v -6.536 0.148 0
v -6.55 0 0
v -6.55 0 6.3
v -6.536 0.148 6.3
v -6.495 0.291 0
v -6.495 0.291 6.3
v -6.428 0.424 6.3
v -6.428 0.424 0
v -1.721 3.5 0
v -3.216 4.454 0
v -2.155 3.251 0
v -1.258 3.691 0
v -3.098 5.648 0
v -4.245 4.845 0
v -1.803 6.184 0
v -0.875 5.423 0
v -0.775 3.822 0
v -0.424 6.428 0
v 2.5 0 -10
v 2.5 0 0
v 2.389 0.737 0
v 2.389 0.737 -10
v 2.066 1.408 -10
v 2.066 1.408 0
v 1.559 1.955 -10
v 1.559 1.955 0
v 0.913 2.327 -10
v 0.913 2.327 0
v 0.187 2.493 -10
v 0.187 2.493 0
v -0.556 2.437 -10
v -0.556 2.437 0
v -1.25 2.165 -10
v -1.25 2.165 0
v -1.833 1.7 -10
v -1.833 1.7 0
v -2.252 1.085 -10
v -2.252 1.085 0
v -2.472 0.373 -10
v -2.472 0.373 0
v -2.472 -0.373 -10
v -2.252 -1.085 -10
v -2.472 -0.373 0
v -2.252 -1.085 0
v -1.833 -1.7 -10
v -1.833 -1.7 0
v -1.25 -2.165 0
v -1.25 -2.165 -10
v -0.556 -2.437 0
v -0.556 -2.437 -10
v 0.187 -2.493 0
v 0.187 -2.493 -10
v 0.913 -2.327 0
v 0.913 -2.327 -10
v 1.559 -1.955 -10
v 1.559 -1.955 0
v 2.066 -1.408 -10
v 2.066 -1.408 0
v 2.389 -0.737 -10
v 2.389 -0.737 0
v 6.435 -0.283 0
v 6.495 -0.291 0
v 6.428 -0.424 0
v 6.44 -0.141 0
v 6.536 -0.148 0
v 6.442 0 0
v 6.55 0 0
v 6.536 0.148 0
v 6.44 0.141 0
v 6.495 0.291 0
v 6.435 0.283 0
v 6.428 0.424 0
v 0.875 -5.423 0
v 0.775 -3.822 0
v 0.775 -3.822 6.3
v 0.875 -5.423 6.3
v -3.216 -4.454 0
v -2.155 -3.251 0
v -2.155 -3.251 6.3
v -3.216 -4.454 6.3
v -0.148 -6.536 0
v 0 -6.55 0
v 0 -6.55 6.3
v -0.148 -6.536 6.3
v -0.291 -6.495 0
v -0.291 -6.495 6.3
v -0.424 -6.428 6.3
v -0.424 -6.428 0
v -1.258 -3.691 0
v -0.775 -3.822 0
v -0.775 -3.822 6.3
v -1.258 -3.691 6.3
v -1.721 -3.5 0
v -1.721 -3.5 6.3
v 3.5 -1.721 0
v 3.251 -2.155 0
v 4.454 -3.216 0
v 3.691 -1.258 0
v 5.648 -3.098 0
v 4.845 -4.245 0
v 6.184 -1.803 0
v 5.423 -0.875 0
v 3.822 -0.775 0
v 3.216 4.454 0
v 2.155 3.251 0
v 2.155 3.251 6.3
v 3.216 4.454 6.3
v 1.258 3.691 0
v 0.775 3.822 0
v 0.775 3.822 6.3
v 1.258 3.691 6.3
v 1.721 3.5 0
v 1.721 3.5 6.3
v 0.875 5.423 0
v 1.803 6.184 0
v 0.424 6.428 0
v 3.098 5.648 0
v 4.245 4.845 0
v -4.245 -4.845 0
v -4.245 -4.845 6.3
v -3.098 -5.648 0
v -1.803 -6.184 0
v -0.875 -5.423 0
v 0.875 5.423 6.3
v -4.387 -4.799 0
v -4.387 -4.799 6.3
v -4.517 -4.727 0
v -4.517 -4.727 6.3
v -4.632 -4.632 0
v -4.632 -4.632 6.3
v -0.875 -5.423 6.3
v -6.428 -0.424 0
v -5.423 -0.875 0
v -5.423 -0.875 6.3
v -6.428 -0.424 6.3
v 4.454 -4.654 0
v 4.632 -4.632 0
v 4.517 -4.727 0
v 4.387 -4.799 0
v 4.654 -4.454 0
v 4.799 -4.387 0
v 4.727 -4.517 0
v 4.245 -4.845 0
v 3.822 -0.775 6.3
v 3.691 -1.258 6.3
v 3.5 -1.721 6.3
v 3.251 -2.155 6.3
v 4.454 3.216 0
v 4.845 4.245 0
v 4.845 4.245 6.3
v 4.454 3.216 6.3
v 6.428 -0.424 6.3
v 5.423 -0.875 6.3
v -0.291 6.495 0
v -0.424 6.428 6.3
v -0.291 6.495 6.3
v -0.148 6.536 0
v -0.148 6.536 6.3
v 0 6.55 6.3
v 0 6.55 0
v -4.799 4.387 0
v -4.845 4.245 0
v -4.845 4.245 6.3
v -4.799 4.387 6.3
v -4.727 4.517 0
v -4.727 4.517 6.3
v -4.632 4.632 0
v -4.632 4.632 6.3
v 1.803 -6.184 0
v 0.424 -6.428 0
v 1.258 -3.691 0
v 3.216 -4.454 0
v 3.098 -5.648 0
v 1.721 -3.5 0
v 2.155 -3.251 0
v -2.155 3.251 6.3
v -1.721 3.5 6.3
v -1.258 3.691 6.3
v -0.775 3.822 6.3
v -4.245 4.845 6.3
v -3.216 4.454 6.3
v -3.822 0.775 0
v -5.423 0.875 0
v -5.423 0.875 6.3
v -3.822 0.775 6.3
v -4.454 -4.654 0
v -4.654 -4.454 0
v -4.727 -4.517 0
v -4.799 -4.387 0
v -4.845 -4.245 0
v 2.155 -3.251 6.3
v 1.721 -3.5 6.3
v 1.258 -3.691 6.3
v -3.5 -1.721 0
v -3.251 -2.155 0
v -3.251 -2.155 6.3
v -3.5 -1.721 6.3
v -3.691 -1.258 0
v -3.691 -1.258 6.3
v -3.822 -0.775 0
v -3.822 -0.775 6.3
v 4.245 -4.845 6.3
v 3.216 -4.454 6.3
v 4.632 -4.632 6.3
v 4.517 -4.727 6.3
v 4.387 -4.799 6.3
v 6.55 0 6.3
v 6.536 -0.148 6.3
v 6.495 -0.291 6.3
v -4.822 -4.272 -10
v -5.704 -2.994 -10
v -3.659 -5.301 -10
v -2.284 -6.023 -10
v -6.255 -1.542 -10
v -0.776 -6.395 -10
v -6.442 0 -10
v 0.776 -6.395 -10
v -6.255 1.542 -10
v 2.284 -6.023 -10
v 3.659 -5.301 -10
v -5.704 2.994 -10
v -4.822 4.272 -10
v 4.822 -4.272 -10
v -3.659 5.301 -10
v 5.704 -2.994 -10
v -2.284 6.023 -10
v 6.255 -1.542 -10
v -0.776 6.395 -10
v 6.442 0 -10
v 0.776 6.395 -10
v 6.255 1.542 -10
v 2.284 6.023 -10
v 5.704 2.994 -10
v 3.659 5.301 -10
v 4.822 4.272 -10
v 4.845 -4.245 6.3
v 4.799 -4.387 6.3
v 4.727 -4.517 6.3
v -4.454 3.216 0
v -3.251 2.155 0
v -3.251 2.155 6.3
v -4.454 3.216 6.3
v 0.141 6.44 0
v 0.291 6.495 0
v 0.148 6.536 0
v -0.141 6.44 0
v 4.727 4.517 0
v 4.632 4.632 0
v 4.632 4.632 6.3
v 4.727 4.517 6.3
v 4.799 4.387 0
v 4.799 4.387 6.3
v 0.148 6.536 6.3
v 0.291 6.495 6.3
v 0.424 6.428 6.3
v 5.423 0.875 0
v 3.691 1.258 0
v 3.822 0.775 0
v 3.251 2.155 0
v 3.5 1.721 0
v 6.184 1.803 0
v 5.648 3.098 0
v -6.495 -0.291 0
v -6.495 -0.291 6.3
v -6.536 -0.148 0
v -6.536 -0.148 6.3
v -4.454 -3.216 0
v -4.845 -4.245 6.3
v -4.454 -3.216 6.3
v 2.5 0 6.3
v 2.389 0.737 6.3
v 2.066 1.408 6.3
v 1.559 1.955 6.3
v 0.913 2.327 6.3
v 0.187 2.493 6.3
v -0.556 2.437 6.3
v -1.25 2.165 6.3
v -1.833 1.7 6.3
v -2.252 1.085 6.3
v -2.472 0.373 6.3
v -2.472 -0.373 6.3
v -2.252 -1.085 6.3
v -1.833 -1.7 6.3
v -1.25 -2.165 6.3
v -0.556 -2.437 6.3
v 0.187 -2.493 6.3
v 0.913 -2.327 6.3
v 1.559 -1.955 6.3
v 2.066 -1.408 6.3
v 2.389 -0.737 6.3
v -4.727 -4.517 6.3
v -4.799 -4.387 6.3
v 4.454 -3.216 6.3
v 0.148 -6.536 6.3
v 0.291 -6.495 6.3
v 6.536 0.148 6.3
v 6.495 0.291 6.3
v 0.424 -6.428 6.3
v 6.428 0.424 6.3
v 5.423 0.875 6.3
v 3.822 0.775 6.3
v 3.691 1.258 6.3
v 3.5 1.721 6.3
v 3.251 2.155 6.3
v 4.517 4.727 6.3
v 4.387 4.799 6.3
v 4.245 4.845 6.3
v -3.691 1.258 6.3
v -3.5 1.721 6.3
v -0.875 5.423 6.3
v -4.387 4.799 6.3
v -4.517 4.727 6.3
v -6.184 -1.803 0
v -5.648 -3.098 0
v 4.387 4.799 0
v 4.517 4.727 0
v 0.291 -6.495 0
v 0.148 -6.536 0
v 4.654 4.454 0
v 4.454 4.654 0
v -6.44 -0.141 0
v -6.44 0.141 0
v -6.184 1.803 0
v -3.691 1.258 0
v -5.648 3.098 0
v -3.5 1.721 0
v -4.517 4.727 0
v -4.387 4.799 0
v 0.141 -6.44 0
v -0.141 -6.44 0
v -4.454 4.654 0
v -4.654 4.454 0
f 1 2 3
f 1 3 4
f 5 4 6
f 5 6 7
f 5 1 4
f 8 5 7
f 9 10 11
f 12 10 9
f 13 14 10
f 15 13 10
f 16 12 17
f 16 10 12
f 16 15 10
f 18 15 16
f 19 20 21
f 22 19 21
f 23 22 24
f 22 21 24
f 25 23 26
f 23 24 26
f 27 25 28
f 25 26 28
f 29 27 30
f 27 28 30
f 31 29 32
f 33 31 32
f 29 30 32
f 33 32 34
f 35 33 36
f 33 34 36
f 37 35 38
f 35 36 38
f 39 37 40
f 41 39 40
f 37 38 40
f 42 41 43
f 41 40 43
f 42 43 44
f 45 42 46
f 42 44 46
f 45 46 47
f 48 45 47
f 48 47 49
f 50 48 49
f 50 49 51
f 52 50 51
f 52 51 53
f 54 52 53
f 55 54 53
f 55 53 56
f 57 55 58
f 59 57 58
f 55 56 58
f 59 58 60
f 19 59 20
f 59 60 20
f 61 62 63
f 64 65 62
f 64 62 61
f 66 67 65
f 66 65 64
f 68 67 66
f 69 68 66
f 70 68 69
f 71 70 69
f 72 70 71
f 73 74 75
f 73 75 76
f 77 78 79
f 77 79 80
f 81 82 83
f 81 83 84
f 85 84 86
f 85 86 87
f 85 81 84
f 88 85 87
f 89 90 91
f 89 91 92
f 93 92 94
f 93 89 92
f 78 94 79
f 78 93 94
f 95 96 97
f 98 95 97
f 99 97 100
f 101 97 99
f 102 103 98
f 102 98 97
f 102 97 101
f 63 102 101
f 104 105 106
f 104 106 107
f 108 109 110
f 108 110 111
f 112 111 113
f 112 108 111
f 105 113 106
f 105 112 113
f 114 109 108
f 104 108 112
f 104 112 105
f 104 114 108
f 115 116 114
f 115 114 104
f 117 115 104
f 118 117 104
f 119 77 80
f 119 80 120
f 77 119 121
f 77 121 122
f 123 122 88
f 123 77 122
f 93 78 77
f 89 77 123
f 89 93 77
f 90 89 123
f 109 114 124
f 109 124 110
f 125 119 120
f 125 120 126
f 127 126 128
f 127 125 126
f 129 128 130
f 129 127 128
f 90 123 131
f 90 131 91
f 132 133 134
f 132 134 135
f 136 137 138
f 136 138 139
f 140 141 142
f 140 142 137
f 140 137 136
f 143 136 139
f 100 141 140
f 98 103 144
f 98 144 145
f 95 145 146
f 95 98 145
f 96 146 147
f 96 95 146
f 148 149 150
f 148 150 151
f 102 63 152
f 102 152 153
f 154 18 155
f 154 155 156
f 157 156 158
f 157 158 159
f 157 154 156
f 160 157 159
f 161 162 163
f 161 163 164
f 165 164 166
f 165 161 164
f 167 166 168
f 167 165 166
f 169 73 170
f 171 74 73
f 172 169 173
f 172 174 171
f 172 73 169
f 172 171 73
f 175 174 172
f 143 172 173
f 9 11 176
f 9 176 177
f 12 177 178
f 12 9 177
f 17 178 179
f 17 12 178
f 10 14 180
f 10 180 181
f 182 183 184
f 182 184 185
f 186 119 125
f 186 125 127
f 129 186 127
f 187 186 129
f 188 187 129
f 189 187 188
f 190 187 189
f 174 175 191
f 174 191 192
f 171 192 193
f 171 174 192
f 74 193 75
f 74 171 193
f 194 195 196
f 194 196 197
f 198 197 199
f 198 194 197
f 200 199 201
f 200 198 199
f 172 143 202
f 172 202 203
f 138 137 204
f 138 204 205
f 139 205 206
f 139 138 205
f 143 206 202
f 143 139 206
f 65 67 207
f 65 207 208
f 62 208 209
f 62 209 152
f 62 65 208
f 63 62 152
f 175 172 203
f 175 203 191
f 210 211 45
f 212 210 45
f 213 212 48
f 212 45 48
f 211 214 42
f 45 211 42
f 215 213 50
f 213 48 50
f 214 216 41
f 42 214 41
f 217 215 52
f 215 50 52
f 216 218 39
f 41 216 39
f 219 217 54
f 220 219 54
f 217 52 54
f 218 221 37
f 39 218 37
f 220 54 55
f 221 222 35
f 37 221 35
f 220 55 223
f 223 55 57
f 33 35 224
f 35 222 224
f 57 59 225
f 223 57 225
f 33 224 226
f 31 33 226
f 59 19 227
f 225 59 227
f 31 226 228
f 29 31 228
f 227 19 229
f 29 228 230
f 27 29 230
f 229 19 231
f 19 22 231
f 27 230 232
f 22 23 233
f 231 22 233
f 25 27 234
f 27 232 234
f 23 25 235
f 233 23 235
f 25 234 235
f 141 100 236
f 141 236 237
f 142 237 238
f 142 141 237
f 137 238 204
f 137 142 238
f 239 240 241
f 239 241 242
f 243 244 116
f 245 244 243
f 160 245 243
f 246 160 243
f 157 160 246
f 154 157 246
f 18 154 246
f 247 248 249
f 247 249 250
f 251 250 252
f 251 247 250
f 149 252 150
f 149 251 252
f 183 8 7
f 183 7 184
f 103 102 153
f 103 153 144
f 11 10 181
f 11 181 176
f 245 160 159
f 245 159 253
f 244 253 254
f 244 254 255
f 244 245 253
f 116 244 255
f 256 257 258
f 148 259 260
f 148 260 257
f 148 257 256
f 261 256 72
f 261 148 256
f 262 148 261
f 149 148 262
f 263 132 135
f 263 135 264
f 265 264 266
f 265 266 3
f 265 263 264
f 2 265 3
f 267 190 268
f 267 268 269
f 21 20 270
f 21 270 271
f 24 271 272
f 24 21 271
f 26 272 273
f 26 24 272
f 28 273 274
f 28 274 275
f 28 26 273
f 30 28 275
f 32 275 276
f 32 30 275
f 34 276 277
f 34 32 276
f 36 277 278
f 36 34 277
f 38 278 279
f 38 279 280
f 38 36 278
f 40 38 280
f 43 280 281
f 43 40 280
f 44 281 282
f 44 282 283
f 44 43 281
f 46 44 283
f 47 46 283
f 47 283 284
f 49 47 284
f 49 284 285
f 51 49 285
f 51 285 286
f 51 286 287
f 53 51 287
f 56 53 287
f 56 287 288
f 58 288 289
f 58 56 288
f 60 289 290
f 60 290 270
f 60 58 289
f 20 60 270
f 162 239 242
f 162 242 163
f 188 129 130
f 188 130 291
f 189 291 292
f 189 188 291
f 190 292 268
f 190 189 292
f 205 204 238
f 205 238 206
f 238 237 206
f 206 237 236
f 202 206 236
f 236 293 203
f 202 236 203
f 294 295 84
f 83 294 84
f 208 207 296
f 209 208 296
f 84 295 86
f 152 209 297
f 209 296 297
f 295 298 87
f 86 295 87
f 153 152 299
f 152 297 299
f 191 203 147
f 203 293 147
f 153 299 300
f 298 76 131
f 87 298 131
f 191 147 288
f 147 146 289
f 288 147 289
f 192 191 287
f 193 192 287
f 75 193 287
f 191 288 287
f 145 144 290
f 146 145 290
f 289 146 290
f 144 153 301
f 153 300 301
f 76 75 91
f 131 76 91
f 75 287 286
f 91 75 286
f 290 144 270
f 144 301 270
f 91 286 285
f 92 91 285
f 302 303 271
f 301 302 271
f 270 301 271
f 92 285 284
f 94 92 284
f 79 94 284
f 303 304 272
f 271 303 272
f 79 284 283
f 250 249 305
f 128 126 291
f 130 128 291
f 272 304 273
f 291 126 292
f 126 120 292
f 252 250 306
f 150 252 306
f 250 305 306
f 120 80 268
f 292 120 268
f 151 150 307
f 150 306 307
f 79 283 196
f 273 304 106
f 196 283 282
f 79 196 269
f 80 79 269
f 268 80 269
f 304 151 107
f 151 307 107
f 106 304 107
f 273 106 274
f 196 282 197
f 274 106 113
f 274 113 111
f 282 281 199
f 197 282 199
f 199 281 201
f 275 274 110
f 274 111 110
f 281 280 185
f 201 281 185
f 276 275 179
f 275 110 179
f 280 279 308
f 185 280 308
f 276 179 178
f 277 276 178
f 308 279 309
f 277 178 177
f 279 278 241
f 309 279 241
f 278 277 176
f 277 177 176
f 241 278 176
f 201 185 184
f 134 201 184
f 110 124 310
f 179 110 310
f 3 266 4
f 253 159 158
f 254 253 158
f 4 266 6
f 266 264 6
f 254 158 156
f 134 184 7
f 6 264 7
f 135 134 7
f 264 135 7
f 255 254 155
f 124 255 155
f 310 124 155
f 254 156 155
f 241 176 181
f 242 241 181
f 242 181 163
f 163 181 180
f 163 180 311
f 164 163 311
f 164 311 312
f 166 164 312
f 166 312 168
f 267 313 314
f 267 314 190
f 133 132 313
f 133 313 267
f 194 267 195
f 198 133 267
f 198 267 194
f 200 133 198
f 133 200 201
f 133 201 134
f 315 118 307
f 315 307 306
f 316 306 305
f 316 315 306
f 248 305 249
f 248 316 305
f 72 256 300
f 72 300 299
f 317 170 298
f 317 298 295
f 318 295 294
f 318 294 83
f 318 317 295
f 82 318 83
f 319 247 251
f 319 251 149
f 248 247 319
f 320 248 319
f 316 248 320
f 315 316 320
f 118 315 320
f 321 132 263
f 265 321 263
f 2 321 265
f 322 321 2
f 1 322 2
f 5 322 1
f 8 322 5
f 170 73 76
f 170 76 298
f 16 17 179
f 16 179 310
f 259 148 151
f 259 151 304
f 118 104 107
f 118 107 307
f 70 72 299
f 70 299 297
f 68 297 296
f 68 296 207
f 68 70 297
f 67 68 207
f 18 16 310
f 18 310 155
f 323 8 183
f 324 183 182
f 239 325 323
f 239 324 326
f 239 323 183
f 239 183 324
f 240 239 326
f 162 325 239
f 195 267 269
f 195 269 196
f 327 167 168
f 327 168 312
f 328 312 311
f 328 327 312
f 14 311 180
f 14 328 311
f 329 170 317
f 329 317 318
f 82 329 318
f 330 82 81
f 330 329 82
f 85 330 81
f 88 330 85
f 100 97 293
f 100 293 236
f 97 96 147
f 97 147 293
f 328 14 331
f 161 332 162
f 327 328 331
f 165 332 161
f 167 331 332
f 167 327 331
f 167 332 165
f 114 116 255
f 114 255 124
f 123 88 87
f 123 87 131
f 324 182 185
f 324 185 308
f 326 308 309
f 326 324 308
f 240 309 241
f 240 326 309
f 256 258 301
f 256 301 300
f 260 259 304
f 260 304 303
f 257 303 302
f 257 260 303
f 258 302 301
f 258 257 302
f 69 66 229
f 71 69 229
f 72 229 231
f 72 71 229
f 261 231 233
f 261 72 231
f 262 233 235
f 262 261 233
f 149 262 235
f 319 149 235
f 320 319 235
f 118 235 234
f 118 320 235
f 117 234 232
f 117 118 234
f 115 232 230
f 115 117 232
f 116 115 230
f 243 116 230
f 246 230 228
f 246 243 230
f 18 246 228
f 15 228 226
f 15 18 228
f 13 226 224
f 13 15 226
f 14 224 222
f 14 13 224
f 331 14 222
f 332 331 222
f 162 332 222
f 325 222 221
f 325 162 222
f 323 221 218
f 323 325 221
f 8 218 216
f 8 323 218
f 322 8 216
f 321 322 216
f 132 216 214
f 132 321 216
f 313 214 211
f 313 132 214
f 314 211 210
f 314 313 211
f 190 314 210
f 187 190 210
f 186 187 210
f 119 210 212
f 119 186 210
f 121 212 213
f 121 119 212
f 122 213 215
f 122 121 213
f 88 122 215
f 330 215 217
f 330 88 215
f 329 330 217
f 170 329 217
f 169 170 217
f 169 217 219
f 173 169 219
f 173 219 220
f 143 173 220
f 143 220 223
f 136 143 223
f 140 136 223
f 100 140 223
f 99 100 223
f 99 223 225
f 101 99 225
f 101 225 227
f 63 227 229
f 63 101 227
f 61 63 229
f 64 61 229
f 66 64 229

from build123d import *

# Parameters (mm, degrees)
SZKIC1_R                    = 2.5
DODANIE_WYCI_GNI_CIE1_DEPTH = 6.3
SKETCH1_R                   = 6.441701171
SKETCH1_R_2                 = 2.5
BOSS_EXTRUDE1_DEPTH         = 10


with BuildPart() as part:
    # Szkic1 → Dodanie-wyciągnięcie1 (new body)
    with BuildSketch(Plane.XY):
        with BuildLine():
            Line((0.875, 5.423398291), (0.775, 3.822221213))
            ThreePointArc((0.775, 3.822221213), (1.492465386, 3.603130177), (2.154710783, 3.250726294))
            Line((2.154710783, 3.250726294), (3.216203275, 4.453640142))
            Line((3.216203275, 4.453640142), (4.245186445, 4.844987722))
            ThreePointArc((4.245186445, 4.844987722), (4.453444634, 4.765560203), (4.631549417, 4.631549417))
            ThreePointArc((4.631549417, 4.631549417), (4.765560203, 4.453444634), (4.844987722, 4.245186445))
            Line((4.844987722, 4.245186445), (4.453640142, 3.216203275))
            Line((4.453640142, 3.216203275), (3.250726294, 2.154710783))
            ThreePointArc((3.250726294, 2.154710783), (3.603130177, 1.492465386), (3.822221213, 0.775))
            Line((3.822221213, 0.775), (5.423398291, 0.875))
            Line((5.423398291, 0.875), (6.427723795, 0.424123551))
            ThreePointArc((6.427723795, 0.424123551), (6.518820836, 0.220699035), (6.55, 0))
            ThreePointArc((6.55, 0), (6.518820836, -0.220699035), (6.427723795, -0.424123551))
            Line((6.427723795, -0.424123551), (5.423398291, -0.875))
            Line((5.423398291, -0.875), (3.822221213, -0.775))
            ThreePointArc((3.822221213, -0.775), (3.603130177, -1.492465386), (3.250726294, -2.154710783))
            Line((3.250726294, -2.154710783), (4.453640142, -3.216203275))
            Line((4.453640142, -3.216203275), (4.844987722, -4.245186445))
            ThreePointArc((4.844987722, -4.245186445), (4.765560203, -4.453444634), (4.631549417, -4.631549417))
            ThreePointArc((4.631549417, -4.631549417), (4.453444634, -4.765560203), (4.245186445, -4.844987722))
            Line((4.245186445, -4.844987722), (3.216203275, -4.453640142))
            Line((3.216203275, -4.453640142), (2.154710783, -3.250726294))
            ThreePointArc((2.154710783, -3.250726294), (1.492465386, -3.603130177), (0.775, -3.822221213))
            Line((0.775, -3.822221213), (0.875, -5.423398291))
            Line((0.875, -5.423398291), (0.424123551, -6.427723795))
            ThreePointArc((0.424123551, -6.427723795), (0.220699035, -6.518820836), (0, -6.55))
            ThreePointArc((0, -6.55), (-0.220699035, -6.518820836), (-0.424123551, -6.427723795))
            Line((-0.424123551, -6.427723795), (-0.875, -5.423398291))
            Line((-0.875, -5.423398291), (-0.775, -3.822221213))
            ThreePointArc((-0.775, -3.822221213), (-1.492465386, -3.603130177), (-2.154710783, -3.250726294))
            Line((-2.154710783, -3.250726294), (-3.216203275, -4.453640142))
            Line((-3.216203275, -4.453640142), (-4.245186445, -4.844987722))
            ThreePointArc((-4.245186445, -4.844987722), (-4.453444634, -4.765560203), (-4.631549417, -4.631549417))
            ThreePointArc((-4.631549417, -4.631549417), (-4.765560203, -4.453444634), (-4.844987722, -4.245186445))
            Line((-4.844987722, -4.245186445), (-4.453640142, -3.216203275))
            Line((-4.453640142, -3.216203275), (-3.250726294, -2.154710783))
            ThreePointArc((-3.250726294, -2.154710783), (-3.603130177, -1.492465386), (-3.822221213, -0.775))
            Line((-3.822221213, -0.775), (-5.423398291, -0.875))
            Line((-5.423398291, -0.875), (-6.427723795, -0.424123551))
            ThreePointArc((-6.427723795, -0.424123551), (-6.518820836, -0.220699035), (-6.55, 0))
            ThreePointArc((-6.55, 0), (-6.518820836, 0.220699035), (-6.427723795, 0.424123551))
            Line((-6.427723795, 0.424123551), (-5.423398291, 0.875))
            Line((-5.423398291, 0.875), (-3.822221213, 0.775))
            ThreePointArc((-3.822221213, 0.775), (-3.603130177, 1.492465386), (-3.250726294, 2.154710783))
            Line((-3.250726294, 2.154710783), (-4.453640142, 3.216203275))
            Line((-4.453640142, 3.216203275), (-4.844987722, 4.245186445))
            ThreePointArc((-4.844987722, 4.245186445), (-4.765560203, 4.453444634), (-4.631549417, 4.631549417))
            ThreePointArc((-4.631549417, 4.631549417), (-4.453444634, 4.765560203), (-4.245186445, 4.844987722))
            Line((-4.245186445, 4.844987722), (-3.216203275, 4.453640142))
            Line((-3.216203275, 4.453640142), (-2.154710783, 3.250726294))
            ThreePointArc((-2.154710783, 3.250726294), (-1.492465386, 3.603130177), (-0.775, 3.822221213))
            Line((-0.775, 3.822221213), (-0.875, 5.423398291))
            Line((-0.875, 5.423398291), (-0.424123551, 6.427723795))
            ThreePointArc((-0.424123551, 6.427723795), (-0.220699035, 6.518820836), (0, 6.55))
            ThreePointArc((0, 6.55), (0.220699035, 6.518820836), (0.424123551, 6.427723795))
            Line((0.424123551, 6.427723795), (0.875, 5.423398291))
        make_face()
        Circle(SZKIC1_R, mode=Mode.SUBTRACT)
    extrude(amount=DODANIE_WYCI_GNI_CIE1_DEPTH)

    # Sketch1 → Boss-Extrude1 (add)
    with BuildSketch(Plane.XY):
        Circle(SKETCH1_R)
        Circle(SKETCH1_R_2, mode=Mode.SUBTRACT)
    extrude(amount=-BOSS_EXTRUDE1_DEPTH)


solid = part.part
